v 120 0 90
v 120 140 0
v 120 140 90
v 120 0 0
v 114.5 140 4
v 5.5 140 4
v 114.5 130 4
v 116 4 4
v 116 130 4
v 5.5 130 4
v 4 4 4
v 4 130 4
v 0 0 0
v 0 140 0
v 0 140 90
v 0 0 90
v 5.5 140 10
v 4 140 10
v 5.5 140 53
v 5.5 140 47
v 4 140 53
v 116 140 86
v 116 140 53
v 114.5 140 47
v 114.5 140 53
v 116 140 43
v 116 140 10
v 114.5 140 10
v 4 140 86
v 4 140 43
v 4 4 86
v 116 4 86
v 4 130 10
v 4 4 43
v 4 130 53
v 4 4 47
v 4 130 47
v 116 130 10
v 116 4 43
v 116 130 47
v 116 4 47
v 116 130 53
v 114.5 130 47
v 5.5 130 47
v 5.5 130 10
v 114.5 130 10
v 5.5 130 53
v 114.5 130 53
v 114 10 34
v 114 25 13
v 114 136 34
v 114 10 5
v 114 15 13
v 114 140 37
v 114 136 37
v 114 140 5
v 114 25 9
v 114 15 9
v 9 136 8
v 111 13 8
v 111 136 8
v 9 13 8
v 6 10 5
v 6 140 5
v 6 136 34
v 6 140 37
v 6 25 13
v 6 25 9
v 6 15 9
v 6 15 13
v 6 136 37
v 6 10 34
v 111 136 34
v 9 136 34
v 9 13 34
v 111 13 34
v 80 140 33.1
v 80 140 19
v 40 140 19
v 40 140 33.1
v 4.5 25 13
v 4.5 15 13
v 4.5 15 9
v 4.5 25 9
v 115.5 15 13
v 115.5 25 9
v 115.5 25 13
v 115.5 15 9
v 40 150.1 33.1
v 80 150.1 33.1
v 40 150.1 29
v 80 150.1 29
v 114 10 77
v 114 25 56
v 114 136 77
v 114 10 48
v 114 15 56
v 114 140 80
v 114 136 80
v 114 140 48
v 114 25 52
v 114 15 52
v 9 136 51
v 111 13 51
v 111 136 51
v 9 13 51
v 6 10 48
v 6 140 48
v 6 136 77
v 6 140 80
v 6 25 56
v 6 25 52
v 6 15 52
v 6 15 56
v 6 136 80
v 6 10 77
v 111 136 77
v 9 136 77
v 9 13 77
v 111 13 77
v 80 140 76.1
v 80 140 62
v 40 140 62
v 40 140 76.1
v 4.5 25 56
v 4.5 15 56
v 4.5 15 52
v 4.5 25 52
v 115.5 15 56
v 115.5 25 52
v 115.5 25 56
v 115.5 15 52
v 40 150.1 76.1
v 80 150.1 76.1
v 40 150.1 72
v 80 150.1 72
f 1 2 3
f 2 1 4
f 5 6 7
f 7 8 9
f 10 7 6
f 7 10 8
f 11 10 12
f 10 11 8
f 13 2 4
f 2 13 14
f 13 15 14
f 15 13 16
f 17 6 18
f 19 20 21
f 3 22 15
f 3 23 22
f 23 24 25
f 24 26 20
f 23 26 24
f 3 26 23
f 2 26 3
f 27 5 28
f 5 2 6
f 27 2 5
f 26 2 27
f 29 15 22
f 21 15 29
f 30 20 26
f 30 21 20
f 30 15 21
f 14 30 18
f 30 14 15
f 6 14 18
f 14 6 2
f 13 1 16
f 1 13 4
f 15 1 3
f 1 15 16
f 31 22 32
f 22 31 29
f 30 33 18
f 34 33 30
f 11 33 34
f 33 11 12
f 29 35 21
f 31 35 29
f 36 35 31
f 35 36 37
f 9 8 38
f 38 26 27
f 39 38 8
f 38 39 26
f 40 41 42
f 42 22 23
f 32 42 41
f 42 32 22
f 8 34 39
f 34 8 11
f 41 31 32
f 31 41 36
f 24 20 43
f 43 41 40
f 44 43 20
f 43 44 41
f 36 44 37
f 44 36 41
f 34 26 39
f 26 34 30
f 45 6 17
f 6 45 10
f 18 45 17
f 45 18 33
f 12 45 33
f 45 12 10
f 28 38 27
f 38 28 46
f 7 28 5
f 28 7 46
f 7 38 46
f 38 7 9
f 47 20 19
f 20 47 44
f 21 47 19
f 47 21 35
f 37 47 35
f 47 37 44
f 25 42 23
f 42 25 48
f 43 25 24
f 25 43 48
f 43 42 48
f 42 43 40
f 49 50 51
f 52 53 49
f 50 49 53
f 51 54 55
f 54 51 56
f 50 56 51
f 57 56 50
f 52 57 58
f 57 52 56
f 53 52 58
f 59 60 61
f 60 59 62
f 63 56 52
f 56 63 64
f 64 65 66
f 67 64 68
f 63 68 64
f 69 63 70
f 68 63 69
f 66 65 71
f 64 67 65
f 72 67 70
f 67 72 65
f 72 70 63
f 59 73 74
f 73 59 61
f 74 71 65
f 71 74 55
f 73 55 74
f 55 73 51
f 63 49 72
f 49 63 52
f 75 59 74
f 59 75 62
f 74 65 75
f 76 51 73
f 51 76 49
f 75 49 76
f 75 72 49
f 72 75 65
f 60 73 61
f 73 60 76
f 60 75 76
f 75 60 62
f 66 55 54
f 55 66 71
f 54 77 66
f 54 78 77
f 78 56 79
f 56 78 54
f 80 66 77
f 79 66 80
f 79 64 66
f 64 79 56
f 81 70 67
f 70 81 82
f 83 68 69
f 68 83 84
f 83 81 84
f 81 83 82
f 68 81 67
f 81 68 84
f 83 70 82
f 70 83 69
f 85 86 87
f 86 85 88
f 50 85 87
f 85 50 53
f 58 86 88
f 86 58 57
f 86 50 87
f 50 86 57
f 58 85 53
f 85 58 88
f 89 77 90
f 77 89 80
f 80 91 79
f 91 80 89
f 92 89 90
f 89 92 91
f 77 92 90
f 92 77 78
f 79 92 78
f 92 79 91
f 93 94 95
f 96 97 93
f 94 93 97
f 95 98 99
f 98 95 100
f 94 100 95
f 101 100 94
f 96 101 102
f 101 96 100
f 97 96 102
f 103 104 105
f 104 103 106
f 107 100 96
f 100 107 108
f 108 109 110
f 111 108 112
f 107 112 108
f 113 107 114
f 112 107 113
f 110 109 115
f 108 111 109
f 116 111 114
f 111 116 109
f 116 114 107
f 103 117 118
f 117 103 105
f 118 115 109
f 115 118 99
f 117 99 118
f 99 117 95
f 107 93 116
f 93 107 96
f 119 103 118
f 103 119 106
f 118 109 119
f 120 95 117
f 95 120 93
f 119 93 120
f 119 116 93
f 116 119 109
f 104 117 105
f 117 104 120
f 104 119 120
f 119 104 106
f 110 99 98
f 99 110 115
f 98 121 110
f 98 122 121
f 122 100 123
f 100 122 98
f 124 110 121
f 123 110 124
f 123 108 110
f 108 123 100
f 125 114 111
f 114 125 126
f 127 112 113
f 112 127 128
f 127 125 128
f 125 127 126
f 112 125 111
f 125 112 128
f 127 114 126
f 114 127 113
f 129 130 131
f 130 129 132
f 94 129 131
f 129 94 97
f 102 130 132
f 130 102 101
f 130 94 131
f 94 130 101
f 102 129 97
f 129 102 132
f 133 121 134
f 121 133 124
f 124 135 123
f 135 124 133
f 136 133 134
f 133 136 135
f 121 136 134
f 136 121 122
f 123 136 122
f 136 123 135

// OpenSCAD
cadverify_only = "";
module instance(name, part, unit = 1) {
    echo(cadverify_instance = [name, part, unit]);
    if (cadverify_only == "" || cadverify_only == name) children();
}

part = "assembly"; // [assembly, frame, drawer]

// ---------- parameters (mm) ----------
W = 120; Df = 140; H = 90; t = 4;
DW = 108; DDbox = 126; frontT = 4; pullP = 10; DH = 32;

// frame assembly geometry (assembly coords: x 0..120, y 0..140 back->front, z 0..90)
module frame_asm() {
    union() {
        // bottom
        cube([120, 140, 4]);
        // top
        translate([0, 0, 86]) cube([120, 140, 4]);
        // left wall
        cube([4, 140, 90]);
        // right wall
        translate([116, 0, 0]) cube([4, 140, 90]);
        // back wall
        cube([120, 4, 90]);
        // middle shelf (between side walls, from back to front)
        translate([4, 0, 43]) cube([112, 140, 4]);
        // stop blocks: overlap into walls/floors by 0.1 for manifold union
        // lower left
        translate([3.9, 130, 3.9]) cube([1.6, 10, 6.1]);
        // lower right
        translate([114.5, 130, 3.9]) cube([1.6, 10, 6.1]);
        // upper left (on middle shelf)
        translate([3.9, 130, 46.9]) cube([1.6, 10, 6.1]);
        // upper right
        translate([114.5, 130, 46.9]) cube([1.6, 10, 6.1]);
    }
}

// drawer local geometry (local coords: box min at 0,0,0; x 0..108, y 0..130 box+front, pull to 140, z 0..32, tabs to x -1.5..109.5)
module drawer_local() {
    union() {
        // bottom
        cube([108, 126, 3]);
        // left wall
        translate([0, 0, 3]) cube([3, 126, 26]);
        // right wall
        translate([105, 0, 3]) cube([3, 126, 26]);
        // back wall
        translate([0, 0, 3]) cube([108, 3, 26]);
        // front panel (full height)
        translate([0, 126, 0]) cube([108, 4, 32]);
        // stop tabs (overlap 0.5 into side walls)
        translate([-1.5, 5, 4]) cube([2.0, 10, 4]);
        translate([107.5, 5, 4]) cube([2.0, 10, 4]);
        // pull wedge: convex hull of 4 bars along X at YZ corners
        hull() {
            translate([34, 129.9, 14]) cube([40, 0.1, 0.1]);
            translate([34, 129.9, 28]) cube([40, 0.1, 0.1]);
            translate([34, 140, 24]) cube([40, 0.1, 0.1]);
            translate([34, 140, 28]) cube([40, 0.1, 0.1]);
        }
    }
}

module frame_print() {
    translate([0, 90, 0]) rotate([90, 0, 0]) frame_asm();
}
module drawer_print() {
    drawer_local();
}

if (part == "frame") {
    echo(cadverify_spec = [
        ["bounds", [[0, 0, 0], [120, 90, 140]]],
        ["bodies", 1],
        ["through_holes", 0],
        ["support_faces", [["bed", "-z", 5000]]],
        ["overhangs_allowed", [
            ["lower_left_block", [[3.5, 79, 129], [6, 87, 141]]],
            ["lower_right_block", [[114, 79, 129], [117, 87, 141]]],
            ["upper_left_block", [[3.5, 36, 129], [6, 44, 141]]],
            ["upper_right_block", [[114, 36, 129], [117, 44, 141]]]
        ]],
        ["copies", 1],
        ["details", [
            ["side_wall", "thickness", [-1, 65, 70], [1, 0, 0], 4],
            ["back_plate", "thickness", [60, 65, -1], [0, 0, 1], 4],
            ["block_ll", "material", [[4, 80, 130], [5.5, 86, 140]], 0.9],
            ["block_lr", "material", [[114.5, 80, 130], [116, 86, 140]], 0.9],
            ["block_ul", "material", [[4, 37, 130], [5.5, 43, 140]], 0.9],
            ["block_ur", "material", [[114.5, 37, 130], [116, 43, 140]], 0.9],
            ["cavity_lower", "void", [[6, 47, 4], [114, 86, 129]], 0.9],
            ["cavity_upper", "void", [[6, 4, 4], [114, 43, 129]], 0.9]
        ]]
    ]);
    frame_print();
} else if (part == "drawer") {
    echo(cadverify_spec = [
        ["bounds", [[-1.5, 0, 0], [109.5, 140, 32]]],
        ["bodies", 1],
        ["through_holes", 0],
        ["support_faces", [["bed", "-z", 5000]]],
        ["overhangs_allowed", [
            ["tab_left", [[-2, 4, 3], [1, 16, 9]]],
            ["tab_right", [[107, 4, 3], [111, 16, 9]]],
            ["pull_underside", [[33, 129, 13], [75, 141, 29]]]
        ]],
        ["copies", 2],
        ["details", [
            ["bottom", "thickness", [54, 60, -1], [0, 0, 1], 3],
            ["side_wall", "thickness", [-1, 60, 15], [1, 0, 0], 3],
            ["tab_left", "material", [[-1.5, 5, 4], [0.5, 15, 8]], 0.9],
            ["tab_right", "material", [[107.5, 5, 4], [109.5, 15, 8]], 0.9],
            ["interior", "void", [[4, 4, 4], [104, 125, 28]], 0.9],
            ["pull", "view", [[34, 129, 14], [74, 140, 28]]]
        ]]
    ]);
    drawer_print();
} else if (part == "assembly") {
    echo(cadverify_spec = [
        ["bounds", [[0, 0, 0], [120, 150, 90]]],
        ["support_faces", [["desk", "-z", 5000]]],
        ["allowed_interferences", []],
        ["motions", [
            ["lower_slide", ["drawer_lower"], "slide", [0, 1, 0], [0, 105]],
            ["upper_slide", ["drawer_upper"], "slide", [0, 1, 0], [0, 105]]
        ]],
        ["assembly_order", [
            [["frame"], [0, 0, 0]],
            [["drawer_lower"], [0, -1, -0.03]],
            [["drawer_upper"], [0, -1, -0.03]]
        ]]
    ]);
    instance("frame", "frame") frame_asm();
    instance("drawer_lower", "drawer", 1) translate([6, 10, 5]) drawer_local();
    instance("drawer_upper", "drawer", 1) translate([6, 10, 48]) drawer_local();
}
